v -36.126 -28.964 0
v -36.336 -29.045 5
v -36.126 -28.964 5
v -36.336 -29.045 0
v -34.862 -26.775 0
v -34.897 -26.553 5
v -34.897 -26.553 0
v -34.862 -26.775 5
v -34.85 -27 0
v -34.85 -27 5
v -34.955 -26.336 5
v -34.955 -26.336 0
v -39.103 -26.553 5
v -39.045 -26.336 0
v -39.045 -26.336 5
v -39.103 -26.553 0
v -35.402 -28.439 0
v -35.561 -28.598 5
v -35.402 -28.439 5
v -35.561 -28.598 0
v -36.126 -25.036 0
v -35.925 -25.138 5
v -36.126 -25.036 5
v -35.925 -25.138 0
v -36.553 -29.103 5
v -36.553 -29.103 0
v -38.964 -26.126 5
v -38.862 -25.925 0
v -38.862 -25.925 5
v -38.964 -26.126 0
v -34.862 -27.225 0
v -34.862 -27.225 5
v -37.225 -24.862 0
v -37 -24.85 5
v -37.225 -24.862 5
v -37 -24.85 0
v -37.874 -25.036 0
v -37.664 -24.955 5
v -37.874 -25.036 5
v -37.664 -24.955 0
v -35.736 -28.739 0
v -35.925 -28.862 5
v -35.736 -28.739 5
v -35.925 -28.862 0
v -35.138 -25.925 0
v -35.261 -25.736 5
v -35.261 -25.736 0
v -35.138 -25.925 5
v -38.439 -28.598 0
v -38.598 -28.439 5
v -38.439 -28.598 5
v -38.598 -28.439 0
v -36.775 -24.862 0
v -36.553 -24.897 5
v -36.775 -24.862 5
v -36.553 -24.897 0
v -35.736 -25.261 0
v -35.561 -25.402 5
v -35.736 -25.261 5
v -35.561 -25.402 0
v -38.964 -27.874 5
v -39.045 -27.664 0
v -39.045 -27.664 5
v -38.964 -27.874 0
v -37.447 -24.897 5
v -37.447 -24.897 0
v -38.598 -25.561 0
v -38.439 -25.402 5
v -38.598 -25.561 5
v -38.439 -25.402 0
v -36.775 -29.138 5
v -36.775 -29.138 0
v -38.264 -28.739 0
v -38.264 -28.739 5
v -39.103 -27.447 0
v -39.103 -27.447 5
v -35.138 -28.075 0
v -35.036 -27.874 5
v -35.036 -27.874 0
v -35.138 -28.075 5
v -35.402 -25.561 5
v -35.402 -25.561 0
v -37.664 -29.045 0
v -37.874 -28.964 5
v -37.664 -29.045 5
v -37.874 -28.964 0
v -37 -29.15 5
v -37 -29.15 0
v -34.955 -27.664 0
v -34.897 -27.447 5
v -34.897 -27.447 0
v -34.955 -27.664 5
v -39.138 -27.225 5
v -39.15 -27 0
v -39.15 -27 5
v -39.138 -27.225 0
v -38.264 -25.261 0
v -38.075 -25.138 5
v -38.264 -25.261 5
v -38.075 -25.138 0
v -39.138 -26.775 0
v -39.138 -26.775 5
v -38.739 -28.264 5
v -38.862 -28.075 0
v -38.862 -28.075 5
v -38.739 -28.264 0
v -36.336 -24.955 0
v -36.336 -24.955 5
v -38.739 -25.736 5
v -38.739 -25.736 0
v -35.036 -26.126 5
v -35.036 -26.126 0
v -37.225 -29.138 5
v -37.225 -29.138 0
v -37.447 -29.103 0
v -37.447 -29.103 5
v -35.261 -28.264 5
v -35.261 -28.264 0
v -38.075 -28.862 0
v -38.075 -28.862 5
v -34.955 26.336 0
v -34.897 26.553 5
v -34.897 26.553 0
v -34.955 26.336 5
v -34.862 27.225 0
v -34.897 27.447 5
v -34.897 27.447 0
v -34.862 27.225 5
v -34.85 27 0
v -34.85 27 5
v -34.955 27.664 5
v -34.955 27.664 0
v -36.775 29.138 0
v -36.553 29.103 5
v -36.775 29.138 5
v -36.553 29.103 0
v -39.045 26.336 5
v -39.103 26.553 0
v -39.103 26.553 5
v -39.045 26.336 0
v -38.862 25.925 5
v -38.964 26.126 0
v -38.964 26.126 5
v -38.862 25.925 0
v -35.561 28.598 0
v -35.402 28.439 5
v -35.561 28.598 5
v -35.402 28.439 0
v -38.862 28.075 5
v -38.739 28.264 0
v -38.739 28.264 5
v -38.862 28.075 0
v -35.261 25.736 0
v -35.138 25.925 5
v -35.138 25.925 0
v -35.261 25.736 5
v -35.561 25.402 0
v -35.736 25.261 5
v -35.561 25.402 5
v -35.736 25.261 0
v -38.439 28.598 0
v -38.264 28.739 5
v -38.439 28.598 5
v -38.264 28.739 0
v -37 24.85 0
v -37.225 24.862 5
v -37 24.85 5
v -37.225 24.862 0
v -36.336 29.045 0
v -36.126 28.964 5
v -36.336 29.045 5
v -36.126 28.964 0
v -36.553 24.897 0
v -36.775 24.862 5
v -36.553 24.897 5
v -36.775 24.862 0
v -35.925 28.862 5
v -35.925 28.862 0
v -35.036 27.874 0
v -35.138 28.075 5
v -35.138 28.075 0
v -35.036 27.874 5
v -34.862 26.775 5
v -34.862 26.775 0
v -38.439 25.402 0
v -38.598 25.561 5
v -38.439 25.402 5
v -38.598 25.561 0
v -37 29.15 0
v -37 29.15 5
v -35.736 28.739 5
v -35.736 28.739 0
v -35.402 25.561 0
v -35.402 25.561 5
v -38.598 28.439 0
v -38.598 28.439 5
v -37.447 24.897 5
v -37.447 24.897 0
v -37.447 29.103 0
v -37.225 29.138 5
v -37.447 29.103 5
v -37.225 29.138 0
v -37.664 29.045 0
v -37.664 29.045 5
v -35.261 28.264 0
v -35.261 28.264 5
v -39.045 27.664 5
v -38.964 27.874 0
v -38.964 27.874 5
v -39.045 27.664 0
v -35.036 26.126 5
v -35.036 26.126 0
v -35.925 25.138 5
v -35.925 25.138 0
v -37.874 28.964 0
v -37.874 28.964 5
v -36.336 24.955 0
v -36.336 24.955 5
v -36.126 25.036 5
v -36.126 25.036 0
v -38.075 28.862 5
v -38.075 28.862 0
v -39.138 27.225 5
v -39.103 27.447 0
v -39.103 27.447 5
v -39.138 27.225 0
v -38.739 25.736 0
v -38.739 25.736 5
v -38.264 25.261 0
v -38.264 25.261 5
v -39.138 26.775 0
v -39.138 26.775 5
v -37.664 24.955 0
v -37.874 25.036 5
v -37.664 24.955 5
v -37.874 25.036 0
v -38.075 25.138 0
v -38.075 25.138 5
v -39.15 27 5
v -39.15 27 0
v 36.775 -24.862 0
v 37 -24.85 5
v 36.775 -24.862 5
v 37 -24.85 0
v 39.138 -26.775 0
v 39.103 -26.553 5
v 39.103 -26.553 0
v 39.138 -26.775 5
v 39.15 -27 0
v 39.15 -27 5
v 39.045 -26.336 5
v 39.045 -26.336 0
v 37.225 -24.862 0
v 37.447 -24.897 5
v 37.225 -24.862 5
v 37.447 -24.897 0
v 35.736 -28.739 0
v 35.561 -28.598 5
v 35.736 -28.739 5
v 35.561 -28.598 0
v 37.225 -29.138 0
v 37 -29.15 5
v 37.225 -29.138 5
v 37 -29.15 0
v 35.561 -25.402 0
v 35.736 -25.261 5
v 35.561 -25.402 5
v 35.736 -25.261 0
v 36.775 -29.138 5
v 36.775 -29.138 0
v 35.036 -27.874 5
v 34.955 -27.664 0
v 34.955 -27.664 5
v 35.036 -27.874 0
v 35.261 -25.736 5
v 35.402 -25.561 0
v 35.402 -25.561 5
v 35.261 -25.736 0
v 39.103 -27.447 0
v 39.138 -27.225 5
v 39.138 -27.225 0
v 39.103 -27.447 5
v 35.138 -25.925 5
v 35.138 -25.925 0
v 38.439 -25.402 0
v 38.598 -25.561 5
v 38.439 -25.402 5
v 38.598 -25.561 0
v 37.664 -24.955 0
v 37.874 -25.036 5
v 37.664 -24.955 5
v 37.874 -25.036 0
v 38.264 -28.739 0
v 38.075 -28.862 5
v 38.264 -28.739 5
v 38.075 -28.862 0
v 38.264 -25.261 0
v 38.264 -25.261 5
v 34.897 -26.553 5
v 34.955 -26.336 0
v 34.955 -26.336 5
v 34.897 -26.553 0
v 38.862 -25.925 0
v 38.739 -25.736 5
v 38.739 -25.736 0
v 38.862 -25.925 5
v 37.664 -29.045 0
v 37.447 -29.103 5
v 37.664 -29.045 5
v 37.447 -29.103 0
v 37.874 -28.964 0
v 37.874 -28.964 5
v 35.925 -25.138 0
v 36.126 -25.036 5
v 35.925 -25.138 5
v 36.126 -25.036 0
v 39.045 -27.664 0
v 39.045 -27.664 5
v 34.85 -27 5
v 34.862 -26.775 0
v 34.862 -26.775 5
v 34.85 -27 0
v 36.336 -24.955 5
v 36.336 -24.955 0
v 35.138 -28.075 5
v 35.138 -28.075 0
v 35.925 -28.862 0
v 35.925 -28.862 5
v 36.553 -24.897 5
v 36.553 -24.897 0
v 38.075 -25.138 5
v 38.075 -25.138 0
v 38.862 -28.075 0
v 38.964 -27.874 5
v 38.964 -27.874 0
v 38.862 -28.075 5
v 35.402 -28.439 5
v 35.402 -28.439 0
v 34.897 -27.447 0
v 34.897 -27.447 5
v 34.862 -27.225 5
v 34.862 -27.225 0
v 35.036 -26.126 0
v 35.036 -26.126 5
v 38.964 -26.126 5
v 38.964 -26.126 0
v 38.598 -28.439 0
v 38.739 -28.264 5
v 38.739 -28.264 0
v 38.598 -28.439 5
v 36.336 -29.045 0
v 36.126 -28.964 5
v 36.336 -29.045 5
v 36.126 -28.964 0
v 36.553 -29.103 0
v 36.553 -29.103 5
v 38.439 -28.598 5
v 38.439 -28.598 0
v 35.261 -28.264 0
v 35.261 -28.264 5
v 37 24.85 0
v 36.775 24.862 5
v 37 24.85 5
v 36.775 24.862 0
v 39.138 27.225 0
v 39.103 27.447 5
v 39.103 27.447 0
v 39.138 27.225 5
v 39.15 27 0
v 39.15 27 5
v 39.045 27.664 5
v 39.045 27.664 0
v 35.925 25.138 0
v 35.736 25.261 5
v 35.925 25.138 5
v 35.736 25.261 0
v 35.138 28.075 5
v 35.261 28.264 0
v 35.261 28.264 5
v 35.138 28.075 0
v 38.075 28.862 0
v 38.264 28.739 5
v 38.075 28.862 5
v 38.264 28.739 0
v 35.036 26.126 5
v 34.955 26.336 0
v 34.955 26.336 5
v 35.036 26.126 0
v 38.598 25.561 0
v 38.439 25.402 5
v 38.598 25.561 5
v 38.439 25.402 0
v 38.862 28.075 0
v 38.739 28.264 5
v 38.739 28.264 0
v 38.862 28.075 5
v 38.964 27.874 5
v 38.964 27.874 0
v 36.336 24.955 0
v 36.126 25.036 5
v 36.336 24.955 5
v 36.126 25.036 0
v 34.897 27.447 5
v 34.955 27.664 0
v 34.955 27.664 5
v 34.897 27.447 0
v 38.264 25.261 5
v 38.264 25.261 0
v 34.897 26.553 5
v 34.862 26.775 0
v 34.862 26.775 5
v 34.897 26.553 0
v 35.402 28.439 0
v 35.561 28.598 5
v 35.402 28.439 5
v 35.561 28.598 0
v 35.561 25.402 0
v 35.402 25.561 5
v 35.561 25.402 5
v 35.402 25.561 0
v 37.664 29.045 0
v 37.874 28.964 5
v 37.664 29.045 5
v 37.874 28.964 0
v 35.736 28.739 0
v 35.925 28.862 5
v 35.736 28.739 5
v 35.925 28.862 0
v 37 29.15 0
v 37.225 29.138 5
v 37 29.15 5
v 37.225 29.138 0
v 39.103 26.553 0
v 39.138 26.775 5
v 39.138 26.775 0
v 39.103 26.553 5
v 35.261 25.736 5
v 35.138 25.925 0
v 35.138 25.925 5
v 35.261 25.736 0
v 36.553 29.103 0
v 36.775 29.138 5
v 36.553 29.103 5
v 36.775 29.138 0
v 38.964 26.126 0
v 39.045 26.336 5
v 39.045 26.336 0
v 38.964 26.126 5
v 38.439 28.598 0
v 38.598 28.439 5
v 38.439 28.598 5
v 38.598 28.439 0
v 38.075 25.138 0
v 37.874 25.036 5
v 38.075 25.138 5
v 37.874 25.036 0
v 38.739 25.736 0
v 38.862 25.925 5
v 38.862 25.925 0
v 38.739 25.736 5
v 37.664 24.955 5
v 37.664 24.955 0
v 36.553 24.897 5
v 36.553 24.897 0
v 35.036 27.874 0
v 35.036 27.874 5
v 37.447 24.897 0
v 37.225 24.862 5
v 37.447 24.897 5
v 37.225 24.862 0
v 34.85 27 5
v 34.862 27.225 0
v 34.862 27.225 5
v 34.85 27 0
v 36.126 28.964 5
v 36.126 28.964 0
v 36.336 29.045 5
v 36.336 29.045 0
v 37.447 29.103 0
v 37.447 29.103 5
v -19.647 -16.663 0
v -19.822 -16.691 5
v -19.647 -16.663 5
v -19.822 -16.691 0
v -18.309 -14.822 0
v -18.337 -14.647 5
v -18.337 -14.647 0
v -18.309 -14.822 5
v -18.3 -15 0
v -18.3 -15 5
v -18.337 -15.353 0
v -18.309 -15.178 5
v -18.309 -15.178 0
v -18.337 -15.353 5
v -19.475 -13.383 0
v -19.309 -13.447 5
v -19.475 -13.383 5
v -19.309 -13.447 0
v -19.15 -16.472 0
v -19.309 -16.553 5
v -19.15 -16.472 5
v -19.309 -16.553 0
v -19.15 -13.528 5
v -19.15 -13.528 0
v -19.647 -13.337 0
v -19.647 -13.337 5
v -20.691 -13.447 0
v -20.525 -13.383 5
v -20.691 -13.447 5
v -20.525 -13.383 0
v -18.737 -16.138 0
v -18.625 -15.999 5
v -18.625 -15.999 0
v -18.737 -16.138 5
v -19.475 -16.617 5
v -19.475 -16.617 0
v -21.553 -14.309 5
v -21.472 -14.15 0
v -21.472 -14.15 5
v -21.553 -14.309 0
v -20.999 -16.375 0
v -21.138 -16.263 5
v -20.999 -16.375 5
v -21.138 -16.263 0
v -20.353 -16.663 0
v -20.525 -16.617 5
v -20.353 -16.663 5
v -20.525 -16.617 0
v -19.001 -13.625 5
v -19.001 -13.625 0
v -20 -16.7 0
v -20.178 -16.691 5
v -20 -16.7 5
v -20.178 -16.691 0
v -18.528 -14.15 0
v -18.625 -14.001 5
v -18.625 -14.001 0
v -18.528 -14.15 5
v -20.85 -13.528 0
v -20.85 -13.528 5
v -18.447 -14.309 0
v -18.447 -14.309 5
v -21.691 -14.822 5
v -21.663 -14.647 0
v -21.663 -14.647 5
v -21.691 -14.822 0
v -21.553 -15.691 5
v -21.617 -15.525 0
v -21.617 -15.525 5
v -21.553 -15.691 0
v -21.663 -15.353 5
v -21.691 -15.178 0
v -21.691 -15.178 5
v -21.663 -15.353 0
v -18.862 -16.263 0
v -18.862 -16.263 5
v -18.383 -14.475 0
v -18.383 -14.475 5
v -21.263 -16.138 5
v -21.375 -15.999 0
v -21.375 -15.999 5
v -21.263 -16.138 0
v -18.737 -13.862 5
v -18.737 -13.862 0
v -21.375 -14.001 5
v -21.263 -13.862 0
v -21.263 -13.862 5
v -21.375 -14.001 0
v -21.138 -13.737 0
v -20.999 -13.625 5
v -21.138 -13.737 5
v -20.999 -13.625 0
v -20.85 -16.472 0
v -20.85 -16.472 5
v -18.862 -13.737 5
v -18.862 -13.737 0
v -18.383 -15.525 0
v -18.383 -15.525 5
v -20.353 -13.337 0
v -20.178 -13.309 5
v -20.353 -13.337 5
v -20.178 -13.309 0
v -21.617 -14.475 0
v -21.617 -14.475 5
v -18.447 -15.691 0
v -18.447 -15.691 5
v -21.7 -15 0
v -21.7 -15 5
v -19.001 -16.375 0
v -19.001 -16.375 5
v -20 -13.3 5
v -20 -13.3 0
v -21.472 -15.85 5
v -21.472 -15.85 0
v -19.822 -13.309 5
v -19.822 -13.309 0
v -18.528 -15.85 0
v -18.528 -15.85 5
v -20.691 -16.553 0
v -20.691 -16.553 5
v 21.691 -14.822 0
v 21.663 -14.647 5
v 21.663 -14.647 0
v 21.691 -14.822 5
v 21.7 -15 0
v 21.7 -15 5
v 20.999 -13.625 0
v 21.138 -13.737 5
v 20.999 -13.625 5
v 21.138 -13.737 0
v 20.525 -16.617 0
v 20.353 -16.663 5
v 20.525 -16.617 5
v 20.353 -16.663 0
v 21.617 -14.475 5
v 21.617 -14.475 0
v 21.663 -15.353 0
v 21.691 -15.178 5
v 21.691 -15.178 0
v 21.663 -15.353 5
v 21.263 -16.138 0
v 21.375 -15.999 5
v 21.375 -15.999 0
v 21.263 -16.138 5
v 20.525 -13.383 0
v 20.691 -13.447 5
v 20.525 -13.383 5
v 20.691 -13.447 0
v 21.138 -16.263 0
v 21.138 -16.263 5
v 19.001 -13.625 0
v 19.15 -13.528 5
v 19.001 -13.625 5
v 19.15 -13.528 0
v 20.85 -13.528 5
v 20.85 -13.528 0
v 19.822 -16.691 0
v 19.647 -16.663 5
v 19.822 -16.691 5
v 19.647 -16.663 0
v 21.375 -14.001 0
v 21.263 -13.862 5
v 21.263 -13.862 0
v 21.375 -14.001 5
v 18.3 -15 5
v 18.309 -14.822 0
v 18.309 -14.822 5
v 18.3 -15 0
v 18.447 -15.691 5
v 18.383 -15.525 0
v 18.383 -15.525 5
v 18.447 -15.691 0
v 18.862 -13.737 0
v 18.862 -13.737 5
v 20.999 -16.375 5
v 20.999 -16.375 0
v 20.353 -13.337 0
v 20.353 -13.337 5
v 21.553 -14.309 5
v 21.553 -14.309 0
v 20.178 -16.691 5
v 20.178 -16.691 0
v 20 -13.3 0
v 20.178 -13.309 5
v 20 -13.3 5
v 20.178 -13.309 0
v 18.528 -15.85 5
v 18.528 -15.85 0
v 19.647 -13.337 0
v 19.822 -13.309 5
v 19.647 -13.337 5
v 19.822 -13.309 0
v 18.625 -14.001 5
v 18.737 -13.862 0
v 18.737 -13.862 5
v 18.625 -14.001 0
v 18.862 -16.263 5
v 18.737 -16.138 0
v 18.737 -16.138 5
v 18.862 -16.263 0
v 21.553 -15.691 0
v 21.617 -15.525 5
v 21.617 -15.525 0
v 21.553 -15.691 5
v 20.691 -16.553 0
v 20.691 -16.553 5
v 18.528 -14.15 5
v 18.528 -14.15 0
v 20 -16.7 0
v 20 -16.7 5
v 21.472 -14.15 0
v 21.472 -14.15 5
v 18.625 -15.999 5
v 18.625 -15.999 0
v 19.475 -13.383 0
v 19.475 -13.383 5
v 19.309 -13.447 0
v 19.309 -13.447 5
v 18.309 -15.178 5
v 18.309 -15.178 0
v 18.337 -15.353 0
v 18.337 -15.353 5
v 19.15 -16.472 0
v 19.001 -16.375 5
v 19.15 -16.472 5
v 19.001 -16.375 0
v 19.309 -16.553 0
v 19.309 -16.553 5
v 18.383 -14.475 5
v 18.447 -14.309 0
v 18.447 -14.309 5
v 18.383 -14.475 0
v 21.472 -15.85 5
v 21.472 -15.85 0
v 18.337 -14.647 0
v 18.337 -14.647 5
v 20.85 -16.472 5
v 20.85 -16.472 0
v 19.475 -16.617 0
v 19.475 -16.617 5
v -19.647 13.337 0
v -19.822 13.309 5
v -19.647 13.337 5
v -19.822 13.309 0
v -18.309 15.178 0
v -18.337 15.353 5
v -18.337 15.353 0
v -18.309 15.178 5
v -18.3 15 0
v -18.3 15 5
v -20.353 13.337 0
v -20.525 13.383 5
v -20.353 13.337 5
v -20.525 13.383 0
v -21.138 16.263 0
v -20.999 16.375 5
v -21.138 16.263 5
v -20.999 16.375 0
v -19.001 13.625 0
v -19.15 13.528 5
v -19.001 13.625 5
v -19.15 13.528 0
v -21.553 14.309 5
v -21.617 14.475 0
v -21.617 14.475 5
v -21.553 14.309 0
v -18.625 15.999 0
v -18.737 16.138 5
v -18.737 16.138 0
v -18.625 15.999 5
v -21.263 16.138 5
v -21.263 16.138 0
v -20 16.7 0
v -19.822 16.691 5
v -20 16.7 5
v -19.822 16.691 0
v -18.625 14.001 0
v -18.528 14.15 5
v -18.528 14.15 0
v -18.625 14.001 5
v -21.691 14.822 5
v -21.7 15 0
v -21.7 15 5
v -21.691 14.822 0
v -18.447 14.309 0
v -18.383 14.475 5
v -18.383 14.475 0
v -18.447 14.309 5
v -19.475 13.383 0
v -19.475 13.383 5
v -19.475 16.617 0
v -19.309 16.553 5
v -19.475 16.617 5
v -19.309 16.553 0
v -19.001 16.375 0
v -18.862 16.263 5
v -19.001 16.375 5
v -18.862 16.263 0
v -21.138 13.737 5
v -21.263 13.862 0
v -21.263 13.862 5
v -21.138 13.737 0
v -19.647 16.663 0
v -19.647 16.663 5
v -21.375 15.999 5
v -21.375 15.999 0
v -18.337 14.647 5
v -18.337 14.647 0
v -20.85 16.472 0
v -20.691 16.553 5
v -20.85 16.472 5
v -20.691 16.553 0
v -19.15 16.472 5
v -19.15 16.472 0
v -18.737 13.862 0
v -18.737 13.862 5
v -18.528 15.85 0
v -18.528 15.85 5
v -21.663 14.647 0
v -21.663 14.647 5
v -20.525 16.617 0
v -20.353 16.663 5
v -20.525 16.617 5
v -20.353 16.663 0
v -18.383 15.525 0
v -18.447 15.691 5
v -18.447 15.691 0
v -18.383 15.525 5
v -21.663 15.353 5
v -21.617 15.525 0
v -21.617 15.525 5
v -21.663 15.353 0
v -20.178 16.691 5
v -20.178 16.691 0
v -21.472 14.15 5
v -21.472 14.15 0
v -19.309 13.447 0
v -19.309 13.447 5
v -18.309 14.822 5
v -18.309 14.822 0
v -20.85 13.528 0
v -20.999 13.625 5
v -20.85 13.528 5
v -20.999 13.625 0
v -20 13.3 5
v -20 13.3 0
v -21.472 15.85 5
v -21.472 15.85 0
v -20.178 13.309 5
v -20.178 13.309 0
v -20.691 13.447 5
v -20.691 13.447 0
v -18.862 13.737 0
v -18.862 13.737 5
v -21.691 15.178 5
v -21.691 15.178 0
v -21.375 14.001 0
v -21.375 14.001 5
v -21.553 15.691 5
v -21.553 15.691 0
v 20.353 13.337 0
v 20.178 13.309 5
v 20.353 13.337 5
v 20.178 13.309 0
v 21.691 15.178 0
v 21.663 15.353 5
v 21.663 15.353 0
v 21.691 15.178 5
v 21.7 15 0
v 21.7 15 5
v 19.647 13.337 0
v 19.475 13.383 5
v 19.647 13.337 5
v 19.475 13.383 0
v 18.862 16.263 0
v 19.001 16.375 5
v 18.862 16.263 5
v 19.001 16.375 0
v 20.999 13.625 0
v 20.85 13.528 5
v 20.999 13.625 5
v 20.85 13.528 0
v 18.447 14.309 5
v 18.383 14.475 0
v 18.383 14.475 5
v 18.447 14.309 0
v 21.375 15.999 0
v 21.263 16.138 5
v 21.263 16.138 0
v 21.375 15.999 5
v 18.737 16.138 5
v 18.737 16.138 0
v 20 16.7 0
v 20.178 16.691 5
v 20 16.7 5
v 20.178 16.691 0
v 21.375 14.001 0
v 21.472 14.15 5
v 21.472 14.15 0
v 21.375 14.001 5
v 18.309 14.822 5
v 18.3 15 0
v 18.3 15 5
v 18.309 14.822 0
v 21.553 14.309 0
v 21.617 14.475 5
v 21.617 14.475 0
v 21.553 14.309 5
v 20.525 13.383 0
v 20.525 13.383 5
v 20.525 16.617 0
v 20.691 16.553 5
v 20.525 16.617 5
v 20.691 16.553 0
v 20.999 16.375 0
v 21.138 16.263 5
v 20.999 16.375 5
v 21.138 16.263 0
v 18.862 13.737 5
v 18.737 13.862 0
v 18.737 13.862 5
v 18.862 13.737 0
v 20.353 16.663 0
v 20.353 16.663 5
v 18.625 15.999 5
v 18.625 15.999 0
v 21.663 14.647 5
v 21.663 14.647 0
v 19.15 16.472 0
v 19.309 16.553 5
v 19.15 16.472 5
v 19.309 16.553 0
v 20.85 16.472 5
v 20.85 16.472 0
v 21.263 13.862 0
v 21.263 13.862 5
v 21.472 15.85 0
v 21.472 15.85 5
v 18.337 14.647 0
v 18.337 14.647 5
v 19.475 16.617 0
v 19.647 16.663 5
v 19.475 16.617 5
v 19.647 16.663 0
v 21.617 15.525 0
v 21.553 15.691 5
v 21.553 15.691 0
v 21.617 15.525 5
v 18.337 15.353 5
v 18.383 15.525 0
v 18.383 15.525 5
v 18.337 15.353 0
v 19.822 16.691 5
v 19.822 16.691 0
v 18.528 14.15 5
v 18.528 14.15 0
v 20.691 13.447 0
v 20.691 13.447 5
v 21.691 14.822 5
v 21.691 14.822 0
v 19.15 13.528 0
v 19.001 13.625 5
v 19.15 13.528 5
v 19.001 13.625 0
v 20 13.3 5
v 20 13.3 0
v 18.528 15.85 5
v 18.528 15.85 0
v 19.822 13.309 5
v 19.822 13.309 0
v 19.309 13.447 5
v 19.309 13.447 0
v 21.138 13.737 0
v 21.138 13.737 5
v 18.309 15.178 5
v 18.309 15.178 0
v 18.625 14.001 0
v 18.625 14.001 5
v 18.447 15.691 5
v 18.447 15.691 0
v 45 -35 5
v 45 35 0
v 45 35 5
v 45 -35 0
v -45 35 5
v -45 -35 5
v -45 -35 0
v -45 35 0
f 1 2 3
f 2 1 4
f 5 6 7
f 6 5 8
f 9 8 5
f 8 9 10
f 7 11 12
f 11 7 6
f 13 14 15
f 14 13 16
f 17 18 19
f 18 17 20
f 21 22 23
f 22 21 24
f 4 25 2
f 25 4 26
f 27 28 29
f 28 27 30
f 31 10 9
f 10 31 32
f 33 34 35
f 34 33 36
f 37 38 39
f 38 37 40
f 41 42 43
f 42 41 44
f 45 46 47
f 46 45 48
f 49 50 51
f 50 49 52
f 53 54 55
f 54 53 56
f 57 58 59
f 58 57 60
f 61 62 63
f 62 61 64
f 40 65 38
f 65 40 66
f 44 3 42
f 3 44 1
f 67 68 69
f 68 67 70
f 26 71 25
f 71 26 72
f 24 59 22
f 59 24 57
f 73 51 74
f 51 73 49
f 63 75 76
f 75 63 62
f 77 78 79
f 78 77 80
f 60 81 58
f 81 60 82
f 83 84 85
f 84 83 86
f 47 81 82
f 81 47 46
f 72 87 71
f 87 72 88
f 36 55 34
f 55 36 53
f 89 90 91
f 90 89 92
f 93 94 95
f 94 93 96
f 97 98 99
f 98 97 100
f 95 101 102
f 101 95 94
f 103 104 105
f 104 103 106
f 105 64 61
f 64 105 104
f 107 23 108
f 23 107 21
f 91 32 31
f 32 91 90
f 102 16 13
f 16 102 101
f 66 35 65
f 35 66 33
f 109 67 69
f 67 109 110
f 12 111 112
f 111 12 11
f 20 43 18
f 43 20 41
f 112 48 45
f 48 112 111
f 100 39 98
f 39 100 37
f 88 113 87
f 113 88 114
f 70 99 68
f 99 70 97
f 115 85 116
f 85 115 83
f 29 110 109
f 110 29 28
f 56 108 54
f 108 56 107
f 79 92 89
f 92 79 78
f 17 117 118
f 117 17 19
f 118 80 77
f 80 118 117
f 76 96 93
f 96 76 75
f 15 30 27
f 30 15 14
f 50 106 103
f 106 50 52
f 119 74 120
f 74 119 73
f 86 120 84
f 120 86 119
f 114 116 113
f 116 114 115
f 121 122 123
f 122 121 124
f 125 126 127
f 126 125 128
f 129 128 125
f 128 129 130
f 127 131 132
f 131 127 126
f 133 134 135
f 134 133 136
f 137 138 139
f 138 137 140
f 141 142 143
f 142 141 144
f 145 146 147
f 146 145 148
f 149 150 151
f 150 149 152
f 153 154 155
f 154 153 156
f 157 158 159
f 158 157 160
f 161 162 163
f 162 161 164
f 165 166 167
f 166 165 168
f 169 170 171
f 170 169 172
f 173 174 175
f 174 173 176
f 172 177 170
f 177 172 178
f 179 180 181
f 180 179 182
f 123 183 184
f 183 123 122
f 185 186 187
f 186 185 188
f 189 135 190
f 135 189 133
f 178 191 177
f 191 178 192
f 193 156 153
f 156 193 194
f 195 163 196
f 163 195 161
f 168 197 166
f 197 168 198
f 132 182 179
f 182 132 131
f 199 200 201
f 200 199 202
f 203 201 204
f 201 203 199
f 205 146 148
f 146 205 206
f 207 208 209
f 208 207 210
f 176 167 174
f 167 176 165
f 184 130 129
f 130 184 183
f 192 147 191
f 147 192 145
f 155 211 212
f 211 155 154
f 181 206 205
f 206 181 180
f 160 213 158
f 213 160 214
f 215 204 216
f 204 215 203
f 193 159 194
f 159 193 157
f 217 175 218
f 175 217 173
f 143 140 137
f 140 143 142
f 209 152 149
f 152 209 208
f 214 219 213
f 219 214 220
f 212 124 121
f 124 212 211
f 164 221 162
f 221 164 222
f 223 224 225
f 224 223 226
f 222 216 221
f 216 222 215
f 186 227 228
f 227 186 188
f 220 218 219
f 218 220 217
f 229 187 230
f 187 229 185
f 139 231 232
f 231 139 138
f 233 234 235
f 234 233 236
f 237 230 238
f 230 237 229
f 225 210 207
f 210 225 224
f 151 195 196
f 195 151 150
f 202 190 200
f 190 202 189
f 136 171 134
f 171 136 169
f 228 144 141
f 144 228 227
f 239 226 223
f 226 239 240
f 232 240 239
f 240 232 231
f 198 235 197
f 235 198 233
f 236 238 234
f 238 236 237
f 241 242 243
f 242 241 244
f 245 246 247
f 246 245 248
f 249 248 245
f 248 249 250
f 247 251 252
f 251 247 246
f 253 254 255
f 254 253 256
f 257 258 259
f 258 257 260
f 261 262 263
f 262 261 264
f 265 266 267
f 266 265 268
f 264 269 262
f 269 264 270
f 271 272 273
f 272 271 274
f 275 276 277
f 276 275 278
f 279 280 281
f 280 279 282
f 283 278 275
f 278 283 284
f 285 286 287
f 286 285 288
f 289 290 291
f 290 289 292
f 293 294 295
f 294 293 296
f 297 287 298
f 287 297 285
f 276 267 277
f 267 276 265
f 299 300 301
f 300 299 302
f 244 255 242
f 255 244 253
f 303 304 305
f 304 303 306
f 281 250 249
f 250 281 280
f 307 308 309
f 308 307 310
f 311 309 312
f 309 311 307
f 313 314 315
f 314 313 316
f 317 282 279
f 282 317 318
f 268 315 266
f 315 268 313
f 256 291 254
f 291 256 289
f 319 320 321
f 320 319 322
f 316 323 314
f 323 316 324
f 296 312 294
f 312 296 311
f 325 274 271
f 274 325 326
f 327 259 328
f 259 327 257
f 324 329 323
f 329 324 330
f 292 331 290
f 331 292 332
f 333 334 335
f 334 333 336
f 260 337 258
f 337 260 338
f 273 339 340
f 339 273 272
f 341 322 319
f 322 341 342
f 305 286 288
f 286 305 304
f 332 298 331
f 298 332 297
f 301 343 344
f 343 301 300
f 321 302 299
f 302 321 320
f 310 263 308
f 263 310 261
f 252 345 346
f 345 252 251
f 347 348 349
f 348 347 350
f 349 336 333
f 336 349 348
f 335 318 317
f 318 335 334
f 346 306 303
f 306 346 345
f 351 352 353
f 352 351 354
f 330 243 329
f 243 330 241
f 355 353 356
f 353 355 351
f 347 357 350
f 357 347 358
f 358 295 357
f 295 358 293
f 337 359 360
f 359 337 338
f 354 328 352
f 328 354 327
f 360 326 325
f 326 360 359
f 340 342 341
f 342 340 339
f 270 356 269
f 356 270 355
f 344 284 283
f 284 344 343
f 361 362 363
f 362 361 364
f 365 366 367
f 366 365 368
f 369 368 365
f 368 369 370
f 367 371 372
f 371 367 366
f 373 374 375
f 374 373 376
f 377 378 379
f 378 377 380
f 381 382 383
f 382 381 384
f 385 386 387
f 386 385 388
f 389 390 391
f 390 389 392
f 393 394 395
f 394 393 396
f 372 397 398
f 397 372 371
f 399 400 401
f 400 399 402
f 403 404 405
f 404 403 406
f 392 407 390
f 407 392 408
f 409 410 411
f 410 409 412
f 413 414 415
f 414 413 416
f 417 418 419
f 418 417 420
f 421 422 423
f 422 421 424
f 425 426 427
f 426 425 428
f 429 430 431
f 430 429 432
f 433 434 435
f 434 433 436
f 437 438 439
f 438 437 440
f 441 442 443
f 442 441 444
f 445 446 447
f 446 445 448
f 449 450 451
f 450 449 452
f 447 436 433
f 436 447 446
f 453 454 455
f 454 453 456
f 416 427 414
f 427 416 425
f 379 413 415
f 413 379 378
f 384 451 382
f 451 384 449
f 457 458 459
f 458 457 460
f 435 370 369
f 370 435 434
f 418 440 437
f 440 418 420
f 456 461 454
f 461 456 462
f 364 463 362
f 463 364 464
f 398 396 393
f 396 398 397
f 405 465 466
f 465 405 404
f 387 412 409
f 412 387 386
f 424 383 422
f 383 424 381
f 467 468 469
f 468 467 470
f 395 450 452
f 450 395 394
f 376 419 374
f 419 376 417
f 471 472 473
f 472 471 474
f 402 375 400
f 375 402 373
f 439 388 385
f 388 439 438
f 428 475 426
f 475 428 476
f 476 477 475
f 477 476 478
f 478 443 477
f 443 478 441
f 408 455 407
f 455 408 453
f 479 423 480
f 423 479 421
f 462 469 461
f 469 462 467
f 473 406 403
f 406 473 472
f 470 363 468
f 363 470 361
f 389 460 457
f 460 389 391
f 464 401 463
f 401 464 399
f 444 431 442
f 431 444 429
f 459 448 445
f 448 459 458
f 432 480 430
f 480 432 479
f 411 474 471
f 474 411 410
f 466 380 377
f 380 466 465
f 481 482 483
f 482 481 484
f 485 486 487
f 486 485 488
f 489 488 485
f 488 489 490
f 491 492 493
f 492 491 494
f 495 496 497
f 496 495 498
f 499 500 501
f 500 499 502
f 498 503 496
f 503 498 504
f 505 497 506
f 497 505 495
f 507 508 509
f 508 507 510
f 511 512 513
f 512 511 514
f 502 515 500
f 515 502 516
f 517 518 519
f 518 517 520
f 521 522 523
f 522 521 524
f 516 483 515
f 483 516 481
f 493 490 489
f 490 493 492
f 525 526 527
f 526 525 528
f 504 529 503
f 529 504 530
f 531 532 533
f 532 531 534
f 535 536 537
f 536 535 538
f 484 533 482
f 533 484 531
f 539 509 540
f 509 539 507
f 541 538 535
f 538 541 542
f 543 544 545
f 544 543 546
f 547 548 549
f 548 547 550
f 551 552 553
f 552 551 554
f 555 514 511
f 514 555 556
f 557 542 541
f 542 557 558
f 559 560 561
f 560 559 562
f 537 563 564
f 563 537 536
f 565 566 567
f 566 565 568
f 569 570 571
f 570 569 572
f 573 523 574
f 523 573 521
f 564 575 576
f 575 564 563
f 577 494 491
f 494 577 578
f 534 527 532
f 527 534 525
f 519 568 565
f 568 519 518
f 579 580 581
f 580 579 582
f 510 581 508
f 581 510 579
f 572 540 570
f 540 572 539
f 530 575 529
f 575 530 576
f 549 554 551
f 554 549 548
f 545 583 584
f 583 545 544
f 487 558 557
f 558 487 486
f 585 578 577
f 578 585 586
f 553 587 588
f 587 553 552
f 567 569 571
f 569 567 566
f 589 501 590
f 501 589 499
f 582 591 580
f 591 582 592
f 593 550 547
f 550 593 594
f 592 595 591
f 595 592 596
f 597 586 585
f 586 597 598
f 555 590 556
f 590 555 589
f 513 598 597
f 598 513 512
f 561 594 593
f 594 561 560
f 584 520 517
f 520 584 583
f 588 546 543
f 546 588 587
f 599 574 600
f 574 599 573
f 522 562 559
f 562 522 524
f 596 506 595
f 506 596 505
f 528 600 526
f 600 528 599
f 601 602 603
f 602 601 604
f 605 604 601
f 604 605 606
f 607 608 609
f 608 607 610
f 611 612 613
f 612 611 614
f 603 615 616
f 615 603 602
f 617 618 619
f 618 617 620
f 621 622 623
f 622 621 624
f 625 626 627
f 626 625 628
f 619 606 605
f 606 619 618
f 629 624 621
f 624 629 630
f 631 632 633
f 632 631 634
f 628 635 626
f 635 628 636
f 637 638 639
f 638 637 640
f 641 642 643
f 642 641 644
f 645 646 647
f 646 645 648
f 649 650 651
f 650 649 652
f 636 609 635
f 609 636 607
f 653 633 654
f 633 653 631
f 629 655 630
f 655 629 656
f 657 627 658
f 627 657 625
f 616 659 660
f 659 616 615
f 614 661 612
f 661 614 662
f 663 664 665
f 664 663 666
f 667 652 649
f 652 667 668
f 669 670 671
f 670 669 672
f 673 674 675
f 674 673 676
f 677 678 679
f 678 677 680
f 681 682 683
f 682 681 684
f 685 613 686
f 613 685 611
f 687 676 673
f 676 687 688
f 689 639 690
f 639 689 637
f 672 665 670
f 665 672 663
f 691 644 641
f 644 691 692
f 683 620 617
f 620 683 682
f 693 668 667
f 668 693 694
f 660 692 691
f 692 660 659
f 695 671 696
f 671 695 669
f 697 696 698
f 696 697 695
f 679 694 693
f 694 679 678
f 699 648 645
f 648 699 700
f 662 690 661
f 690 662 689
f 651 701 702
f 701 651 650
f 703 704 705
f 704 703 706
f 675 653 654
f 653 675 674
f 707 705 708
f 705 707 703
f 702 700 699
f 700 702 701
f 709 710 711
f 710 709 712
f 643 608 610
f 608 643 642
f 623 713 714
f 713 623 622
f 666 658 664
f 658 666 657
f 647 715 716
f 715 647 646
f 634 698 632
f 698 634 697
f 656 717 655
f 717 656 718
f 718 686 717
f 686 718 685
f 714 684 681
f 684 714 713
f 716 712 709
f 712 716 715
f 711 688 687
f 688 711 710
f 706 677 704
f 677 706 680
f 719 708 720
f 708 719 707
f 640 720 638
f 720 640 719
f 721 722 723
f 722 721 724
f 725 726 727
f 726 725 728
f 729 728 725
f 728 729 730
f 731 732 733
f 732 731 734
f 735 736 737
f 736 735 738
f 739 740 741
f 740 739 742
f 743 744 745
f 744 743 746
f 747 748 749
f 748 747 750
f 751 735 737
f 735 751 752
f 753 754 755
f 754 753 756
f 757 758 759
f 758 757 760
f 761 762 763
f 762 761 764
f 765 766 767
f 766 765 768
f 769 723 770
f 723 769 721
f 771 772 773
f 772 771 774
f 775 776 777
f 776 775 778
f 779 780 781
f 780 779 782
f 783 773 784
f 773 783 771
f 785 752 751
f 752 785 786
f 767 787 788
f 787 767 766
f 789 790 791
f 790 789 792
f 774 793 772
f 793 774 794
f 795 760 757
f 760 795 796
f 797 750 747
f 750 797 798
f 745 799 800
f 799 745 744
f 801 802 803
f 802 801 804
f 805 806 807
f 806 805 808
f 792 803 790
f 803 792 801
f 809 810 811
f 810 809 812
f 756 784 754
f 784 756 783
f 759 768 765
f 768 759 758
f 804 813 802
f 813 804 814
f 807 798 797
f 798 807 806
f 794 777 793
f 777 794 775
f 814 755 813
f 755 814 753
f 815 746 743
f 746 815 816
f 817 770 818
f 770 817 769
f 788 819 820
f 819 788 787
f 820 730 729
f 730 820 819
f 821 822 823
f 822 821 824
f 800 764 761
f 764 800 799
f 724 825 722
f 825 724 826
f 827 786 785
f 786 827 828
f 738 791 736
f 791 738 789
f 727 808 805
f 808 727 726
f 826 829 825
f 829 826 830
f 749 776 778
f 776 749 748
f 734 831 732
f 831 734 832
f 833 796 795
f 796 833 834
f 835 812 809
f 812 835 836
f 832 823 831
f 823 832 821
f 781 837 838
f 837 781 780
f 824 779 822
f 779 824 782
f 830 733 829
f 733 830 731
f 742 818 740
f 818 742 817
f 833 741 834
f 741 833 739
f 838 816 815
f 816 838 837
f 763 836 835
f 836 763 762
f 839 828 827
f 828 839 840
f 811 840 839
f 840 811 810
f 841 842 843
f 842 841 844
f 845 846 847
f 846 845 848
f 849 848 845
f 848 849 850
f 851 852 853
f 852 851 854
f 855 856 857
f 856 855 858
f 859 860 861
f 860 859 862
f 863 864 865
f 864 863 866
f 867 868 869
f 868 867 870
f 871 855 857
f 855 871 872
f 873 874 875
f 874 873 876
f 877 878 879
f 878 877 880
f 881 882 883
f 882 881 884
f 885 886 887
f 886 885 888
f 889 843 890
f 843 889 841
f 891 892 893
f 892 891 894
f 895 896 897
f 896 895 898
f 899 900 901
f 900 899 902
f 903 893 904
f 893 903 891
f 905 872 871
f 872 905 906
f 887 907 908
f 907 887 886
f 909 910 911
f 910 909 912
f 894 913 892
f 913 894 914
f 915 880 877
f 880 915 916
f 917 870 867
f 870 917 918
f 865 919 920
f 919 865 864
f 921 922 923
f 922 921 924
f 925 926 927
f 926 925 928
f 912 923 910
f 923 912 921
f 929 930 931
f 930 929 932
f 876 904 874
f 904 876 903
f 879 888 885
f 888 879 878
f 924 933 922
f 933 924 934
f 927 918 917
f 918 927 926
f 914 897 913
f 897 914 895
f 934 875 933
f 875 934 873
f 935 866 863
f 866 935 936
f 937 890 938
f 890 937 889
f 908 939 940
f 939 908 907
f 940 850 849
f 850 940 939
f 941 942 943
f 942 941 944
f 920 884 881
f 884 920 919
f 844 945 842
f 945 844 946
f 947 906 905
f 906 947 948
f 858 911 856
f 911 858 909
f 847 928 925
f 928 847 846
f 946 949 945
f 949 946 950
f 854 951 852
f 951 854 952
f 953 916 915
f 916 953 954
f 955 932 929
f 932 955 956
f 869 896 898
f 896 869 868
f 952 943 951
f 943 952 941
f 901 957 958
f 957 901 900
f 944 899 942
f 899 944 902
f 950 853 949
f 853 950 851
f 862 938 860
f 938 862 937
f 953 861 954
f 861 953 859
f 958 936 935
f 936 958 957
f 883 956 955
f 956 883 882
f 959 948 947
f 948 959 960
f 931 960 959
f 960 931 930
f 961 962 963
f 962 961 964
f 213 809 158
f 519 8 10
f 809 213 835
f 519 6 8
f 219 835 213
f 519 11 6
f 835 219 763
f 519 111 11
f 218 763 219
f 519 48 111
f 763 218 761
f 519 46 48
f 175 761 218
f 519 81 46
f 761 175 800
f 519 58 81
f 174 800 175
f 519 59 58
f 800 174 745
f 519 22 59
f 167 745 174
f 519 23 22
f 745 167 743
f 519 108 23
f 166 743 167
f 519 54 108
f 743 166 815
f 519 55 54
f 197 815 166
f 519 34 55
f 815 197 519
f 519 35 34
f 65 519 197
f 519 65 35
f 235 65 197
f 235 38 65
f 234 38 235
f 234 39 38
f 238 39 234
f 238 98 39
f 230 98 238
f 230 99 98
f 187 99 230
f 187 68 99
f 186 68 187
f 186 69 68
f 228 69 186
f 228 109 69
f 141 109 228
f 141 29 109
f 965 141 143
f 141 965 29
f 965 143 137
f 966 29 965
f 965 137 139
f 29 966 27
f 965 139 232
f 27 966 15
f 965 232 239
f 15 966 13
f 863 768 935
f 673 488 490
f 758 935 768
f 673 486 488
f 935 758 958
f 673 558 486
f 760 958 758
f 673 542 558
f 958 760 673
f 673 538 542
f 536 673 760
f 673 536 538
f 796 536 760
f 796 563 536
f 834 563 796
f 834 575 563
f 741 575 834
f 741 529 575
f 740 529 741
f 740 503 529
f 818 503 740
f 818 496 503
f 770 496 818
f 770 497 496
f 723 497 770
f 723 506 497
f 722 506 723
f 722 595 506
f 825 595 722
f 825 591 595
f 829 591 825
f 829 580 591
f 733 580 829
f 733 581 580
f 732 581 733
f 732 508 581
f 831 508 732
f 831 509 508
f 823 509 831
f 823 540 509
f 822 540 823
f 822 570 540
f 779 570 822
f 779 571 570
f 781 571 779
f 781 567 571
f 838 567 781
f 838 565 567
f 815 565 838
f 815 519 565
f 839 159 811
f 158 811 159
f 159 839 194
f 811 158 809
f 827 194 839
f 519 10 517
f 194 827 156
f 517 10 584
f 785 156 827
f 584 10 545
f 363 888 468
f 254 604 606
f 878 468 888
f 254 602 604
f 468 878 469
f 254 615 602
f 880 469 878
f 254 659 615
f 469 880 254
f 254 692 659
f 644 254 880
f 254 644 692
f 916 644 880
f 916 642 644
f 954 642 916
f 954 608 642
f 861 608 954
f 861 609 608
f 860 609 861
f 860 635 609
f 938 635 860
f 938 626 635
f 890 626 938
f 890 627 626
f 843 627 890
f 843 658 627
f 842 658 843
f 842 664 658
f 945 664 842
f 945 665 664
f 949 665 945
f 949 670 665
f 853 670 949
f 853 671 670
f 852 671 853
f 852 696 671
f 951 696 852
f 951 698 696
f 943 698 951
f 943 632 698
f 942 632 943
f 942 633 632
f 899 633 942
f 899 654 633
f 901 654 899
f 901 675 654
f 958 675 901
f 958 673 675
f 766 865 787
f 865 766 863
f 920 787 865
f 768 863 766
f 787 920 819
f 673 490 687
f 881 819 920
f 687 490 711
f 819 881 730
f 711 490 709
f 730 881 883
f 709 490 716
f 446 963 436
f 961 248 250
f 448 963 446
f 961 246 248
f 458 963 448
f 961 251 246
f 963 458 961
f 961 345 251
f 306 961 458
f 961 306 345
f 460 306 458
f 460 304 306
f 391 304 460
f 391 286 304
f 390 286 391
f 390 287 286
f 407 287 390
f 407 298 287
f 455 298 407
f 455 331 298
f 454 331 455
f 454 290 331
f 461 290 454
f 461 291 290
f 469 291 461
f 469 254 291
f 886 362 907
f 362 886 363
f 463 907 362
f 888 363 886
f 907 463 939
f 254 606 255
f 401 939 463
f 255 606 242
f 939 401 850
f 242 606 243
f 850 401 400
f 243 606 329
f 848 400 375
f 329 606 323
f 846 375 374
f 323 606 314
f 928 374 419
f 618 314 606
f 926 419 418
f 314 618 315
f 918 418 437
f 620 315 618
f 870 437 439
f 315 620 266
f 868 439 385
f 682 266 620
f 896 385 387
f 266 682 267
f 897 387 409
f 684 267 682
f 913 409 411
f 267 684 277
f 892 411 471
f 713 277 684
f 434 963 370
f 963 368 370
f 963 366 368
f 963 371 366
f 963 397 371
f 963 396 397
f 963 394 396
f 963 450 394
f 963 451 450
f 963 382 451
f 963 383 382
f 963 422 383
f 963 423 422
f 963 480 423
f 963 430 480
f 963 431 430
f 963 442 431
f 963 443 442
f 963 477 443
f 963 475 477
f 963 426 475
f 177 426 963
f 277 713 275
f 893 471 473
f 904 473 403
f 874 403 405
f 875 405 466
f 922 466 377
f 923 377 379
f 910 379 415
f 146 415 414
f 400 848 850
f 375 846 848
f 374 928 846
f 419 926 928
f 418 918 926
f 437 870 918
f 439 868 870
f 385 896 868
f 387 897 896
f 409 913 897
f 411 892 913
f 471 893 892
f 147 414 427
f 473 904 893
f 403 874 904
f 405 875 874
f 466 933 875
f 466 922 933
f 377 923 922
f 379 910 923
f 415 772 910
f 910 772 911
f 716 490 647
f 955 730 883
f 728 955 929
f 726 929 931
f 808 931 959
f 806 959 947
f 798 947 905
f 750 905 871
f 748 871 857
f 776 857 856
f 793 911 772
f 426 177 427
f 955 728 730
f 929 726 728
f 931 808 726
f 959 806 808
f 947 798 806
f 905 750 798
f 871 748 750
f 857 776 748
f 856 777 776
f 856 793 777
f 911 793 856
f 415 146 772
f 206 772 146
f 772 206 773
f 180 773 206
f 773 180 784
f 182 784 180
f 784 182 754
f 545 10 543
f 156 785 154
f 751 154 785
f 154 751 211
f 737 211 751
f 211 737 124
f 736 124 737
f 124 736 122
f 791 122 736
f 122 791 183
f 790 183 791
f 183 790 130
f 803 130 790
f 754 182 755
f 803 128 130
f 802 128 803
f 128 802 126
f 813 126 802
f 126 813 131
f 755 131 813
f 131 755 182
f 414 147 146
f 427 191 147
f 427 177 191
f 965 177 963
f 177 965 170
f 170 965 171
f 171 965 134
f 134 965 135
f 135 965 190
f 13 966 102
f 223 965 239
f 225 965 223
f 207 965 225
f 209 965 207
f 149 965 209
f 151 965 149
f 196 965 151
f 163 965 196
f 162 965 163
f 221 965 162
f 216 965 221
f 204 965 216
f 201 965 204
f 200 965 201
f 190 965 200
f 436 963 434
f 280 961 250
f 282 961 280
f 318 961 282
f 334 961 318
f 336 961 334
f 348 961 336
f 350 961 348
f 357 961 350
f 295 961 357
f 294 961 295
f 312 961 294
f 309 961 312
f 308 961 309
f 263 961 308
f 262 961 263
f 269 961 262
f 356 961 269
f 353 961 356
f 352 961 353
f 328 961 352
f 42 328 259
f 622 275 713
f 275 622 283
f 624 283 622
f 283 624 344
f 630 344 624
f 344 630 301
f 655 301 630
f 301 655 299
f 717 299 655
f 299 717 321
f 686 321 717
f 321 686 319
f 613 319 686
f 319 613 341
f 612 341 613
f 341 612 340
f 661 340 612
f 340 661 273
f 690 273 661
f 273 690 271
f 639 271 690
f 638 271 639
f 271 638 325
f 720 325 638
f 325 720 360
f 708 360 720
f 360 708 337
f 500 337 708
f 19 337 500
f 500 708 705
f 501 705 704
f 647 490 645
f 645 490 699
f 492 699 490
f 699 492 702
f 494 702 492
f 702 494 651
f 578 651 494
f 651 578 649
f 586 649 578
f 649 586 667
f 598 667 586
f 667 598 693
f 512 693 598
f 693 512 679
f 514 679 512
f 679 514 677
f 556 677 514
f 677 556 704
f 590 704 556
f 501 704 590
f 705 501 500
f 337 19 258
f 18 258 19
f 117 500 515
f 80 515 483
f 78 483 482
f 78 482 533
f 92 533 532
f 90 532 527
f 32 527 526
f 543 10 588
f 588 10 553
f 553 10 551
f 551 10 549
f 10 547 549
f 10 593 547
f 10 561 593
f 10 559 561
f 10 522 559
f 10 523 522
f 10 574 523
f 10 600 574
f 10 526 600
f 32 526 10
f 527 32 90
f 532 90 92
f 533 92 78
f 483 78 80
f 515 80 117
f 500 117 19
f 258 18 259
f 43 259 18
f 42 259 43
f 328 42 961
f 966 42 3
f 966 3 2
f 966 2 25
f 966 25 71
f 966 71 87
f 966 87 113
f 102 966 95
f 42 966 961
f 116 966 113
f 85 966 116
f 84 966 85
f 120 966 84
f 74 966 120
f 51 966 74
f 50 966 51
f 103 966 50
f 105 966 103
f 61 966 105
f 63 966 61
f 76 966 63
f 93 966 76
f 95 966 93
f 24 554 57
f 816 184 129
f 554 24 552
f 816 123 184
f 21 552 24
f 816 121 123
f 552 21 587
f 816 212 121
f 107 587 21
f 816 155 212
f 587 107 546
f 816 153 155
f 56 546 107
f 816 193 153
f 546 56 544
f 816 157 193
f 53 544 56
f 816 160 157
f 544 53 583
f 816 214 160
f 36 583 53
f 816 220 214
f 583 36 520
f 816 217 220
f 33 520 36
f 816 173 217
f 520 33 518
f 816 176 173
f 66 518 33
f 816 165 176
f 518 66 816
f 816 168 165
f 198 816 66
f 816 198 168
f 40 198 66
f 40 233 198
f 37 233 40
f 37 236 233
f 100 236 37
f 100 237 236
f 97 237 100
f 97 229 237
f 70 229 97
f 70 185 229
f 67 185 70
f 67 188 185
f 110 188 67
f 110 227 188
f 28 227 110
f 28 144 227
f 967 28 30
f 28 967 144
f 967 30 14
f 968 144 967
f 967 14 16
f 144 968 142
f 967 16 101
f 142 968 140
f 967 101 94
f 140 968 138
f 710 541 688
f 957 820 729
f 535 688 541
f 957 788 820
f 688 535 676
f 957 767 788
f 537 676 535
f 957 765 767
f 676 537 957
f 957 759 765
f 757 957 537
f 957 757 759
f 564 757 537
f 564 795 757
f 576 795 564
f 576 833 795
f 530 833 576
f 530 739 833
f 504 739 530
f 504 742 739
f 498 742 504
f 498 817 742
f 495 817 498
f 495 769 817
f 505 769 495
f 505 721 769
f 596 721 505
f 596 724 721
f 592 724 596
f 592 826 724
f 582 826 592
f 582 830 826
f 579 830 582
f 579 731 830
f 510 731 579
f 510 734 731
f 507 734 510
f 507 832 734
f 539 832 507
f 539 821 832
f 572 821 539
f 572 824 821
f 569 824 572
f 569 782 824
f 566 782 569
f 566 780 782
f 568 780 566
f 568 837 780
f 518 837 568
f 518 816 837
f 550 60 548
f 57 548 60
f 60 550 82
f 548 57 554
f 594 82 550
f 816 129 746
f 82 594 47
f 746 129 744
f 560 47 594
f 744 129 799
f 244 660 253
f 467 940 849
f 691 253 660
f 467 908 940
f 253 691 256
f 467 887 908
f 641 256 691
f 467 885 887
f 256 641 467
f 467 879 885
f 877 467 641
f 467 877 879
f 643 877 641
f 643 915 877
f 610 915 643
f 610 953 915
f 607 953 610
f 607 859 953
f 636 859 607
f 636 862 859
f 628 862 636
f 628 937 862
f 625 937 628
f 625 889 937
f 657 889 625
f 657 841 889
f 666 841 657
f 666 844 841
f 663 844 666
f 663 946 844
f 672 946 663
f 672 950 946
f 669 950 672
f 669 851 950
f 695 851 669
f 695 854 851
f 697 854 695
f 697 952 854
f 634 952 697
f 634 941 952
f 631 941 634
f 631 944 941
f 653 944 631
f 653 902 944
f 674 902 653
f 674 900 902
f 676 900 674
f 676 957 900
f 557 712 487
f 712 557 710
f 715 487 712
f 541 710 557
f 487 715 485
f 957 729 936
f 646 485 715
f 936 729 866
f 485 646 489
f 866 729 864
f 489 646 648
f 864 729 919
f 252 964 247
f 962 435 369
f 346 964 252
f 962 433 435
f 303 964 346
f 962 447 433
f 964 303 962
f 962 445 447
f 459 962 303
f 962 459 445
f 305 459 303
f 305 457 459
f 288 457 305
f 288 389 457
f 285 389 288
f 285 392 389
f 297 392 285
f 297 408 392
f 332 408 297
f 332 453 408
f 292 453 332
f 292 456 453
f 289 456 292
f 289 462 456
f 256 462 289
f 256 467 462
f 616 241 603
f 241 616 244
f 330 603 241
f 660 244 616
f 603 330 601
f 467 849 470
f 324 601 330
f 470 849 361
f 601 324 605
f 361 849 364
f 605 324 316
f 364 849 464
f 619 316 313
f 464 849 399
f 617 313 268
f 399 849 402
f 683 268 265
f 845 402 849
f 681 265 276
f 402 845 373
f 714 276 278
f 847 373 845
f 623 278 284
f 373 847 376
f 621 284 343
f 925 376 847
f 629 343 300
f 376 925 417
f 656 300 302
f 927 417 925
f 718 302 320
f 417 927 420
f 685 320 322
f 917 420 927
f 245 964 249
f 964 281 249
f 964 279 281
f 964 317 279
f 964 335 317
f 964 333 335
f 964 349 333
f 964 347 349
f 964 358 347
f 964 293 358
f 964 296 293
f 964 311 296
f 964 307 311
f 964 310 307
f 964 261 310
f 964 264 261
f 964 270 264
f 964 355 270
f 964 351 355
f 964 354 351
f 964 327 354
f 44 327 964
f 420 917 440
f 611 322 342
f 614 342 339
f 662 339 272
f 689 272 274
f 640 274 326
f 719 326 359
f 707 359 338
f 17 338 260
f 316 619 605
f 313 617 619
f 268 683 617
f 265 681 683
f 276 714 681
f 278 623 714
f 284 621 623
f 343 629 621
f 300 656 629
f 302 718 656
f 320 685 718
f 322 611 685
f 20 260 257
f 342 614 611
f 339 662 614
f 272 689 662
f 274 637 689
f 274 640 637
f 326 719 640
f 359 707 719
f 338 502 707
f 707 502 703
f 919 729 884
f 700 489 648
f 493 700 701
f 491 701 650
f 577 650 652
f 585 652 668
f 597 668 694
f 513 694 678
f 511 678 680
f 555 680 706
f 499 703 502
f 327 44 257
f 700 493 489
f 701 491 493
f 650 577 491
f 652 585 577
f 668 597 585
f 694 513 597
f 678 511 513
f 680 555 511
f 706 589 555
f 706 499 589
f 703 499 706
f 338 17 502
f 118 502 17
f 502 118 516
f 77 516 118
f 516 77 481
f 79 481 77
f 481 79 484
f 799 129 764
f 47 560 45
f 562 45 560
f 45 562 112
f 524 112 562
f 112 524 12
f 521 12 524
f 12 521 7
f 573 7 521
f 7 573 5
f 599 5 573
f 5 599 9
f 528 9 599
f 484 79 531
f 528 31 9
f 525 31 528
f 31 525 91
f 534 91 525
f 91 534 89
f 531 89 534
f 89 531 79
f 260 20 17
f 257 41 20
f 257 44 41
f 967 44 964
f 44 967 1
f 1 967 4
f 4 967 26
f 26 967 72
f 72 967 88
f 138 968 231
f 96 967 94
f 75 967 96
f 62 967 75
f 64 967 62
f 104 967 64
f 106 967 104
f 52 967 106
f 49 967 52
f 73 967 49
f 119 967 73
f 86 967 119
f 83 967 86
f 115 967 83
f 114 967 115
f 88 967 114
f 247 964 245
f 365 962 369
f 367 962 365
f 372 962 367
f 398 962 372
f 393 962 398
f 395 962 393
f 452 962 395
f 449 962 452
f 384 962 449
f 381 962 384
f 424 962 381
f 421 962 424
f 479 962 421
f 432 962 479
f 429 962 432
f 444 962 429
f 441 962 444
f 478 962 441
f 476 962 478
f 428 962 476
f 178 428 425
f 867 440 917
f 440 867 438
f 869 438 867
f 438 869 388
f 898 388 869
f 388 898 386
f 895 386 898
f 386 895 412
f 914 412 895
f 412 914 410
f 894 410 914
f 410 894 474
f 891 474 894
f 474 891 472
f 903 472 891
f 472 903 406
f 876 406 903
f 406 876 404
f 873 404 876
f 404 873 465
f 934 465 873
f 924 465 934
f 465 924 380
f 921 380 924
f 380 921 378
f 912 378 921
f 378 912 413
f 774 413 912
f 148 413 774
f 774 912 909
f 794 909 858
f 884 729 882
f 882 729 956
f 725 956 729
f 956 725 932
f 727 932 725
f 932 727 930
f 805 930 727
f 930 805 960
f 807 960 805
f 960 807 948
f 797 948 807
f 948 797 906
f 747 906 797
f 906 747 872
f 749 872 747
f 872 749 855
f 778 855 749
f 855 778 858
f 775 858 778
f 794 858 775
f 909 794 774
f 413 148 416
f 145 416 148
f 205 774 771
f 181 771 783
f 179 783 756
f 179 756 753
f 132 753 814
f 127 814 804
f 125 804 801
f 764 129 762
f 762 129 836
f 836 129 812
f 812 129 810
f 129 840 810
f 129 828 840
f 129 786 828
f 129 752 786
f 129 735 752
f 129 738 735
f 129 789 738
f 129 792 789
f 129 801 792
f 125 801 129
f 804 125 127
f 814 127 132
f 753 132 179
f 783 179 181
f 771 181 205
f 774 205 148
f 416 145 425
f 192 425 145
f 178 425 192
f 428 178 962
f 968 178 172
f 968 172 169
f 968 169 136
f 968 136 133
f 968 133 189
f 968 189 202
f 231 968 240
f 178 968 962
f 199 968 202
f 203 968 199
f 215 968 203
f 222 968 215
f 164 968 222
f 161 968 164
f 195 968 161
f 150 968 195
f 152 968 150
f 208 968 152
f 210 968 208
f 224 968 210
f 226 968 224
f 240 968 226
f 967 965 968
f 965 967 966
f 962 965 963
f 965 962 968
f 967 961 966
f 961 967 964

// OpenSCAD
// Flat adapter only. Replace hole coordinates with measurements from the purchased galvo block.
plate_w = 90;
plate_h = 70;
plate_t = 5;
corner_hole_d = 4.3;
galvo_hole_d = 3.4;
galvo_holes = [[-20,-15],[20,-15],[-20,15],[20,15]];
$fn=60;

difference() {
  translate([-plate_w/2,-plate_h/2,0]) cube([plate_w,plate_h,plate_t]);
  for (x=[-plate_w/2+8,plate_w/2-8])
    for (y=[-plate_h/2+8,plate_h/2-8])
      translate([x,y,-1]) cylinder(h=plate_t+2,d=corner_hole_d);
  for (p=galvo_holes)
    translate([p[0],p[1],-1]) cylinder(h=plate_t+2,d=galvo_hole_d);
}
